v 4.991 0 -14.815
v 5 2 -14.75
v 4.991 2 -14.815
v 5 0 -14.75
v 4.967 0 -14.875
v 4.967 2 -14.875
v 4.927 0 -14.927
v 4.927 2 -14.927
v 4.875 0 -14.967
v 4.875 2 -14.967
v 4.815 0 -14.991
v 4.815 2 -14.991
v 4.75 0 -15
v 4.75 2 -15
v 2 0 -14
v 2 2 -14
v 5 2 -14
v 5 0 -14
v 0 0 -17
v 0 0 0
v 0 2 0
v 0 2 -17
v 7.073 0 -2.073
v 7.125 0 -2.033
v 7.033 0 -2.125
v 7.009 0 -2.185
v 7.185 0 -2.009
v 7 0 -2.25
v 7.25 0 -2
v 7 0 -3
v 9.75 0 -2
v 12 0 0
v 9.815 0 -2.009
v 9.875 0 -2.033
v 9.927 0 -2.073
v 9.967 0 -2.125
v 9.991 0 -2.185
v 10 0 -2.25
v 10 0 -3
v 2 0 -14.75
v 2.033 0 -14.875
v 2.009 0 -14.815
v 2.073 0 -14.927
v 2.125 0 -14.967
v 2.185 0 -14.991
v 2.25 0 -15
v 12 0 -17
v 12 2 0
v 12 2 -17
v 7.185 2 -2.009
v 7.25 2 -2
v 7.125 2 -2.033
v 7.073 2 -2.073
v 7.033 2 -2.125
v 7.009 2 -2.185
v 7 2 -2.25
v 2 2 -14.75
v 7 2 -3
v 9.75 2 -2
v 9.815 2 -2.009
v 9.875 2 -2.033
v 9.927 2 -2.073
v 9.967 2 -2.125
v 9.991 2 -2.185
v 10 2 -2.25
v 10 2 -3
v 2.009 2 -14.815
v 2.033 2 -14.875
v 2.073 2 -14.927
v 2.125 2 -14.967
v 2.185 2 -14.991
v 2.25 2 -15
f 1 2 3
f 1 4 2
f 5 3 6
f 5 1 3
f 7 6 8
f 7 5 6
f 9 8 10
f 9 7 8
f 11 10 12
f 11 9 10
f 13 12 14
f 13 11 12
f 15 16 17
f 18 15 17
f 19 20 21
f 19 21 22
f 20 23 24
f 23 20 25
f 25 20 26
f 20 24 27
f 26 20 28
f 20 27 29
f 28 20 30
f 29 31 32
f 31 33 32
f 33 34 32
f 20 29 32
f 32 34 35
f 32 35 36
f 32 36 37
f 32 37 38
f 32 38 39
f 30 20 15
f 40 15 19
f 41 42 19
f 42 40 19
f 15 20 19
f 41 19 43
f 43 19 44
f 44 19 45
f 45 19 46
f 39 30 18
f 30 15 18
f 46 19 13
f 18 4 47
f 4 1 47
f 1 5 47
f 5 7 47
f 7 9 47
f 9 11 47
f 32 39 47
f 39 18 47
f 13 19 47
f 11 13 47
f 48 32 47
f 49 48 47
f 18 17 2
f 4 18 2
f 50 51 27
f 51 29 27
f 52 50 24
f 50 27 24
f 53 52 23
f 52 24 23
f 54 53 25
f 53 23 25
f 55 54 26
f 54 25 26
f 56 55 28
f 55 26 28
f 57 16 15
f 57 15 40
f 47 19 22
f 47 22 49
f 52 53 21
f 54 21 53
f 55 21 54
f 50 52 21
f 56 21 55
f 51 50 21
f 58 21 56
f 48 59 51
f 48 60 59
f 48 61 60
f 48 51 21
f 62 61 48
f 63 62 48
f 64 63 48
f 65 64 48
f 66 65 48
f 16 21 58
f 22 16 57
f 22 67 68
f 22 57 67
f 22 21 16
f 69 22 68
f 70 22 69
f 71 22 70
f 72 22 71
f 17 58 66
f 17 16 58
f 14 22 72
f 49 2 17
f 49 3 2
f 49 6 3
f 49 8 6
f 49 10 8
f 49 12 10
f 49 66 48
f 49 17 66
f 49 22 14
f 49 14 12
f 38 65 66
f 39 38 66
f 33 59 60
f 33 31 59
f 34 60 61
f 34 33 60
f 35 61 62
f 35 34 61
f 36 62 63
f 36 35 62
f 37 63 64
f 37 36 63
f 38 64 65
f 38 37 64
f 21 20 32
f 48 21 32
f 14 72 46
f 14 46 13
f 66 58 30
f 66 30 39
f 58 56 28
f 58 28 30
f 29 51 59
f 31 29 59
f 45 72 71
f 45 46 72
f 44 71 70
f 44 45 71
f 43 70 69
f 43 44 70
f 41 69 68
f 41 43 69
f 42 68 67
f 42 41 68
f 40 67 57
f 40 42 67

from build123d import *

# Parameters (mm, degrees)
SKIZZE1_W                       = 12
SKIZZE1_H                       = 17
AUFSATZ_LINEAR_AUSTRAGEN1_DEPTH = 2
SKIZZE3_W                       = 3
SKIZZE3_H                       = 1
SCHNITT_LINEAR_AUSTRAGEN1_DEPTH = 3
VERRUNDUNG1_R                   = 0.25


with BuildPart() as part:
    # Skizze1 → Aufsatz-Linear austragen1 (new body)
    with BuildSketch(Plane(origin=(0, 0, 0), x_dir=(1, 0, 0), z_dir=(0, 1, 0))):
        with Locations((6, 8.5)):
            Rectangle(SKIZZE1_W, SKIZZE1_H)
    extrude(amount=AUFSATZ_LINEAR_AUSTRAGEN1_DEPTH)

    # Skizze3 → Schnitt-Linear austragen1 (cut, through all)
    with BuildSketch(Plane(origin=(0, 2, 0), x_dir=(1, 0, 0), z_dir=(0, 1, 0))):
        with Locations((8.5, 2.5)):
            Rectangle(SKIZZE3_W, SKIZZE3_H)
        with Locations((3.5, 14.5)):
            Rectangle(SKIZZE3_W, SKIZZE3_H)
    extrude(amount=-SCHNITT_LINEAR_AUSTRAGEN1_DEPTH, mode=Mode.SUBTRACT)

    # Verrundung1
    verrundung1_edges = [part.edges().sort_by_distance(p)[0] for p in [
        (7, 1, -2),
        (10, 1, -2),
        (2, 1, -15),
        (5, 1, -15),
    ]]
    fillet(verrundung1_edges, radius=VERRUNDUNG1_R)


solid = part.part
